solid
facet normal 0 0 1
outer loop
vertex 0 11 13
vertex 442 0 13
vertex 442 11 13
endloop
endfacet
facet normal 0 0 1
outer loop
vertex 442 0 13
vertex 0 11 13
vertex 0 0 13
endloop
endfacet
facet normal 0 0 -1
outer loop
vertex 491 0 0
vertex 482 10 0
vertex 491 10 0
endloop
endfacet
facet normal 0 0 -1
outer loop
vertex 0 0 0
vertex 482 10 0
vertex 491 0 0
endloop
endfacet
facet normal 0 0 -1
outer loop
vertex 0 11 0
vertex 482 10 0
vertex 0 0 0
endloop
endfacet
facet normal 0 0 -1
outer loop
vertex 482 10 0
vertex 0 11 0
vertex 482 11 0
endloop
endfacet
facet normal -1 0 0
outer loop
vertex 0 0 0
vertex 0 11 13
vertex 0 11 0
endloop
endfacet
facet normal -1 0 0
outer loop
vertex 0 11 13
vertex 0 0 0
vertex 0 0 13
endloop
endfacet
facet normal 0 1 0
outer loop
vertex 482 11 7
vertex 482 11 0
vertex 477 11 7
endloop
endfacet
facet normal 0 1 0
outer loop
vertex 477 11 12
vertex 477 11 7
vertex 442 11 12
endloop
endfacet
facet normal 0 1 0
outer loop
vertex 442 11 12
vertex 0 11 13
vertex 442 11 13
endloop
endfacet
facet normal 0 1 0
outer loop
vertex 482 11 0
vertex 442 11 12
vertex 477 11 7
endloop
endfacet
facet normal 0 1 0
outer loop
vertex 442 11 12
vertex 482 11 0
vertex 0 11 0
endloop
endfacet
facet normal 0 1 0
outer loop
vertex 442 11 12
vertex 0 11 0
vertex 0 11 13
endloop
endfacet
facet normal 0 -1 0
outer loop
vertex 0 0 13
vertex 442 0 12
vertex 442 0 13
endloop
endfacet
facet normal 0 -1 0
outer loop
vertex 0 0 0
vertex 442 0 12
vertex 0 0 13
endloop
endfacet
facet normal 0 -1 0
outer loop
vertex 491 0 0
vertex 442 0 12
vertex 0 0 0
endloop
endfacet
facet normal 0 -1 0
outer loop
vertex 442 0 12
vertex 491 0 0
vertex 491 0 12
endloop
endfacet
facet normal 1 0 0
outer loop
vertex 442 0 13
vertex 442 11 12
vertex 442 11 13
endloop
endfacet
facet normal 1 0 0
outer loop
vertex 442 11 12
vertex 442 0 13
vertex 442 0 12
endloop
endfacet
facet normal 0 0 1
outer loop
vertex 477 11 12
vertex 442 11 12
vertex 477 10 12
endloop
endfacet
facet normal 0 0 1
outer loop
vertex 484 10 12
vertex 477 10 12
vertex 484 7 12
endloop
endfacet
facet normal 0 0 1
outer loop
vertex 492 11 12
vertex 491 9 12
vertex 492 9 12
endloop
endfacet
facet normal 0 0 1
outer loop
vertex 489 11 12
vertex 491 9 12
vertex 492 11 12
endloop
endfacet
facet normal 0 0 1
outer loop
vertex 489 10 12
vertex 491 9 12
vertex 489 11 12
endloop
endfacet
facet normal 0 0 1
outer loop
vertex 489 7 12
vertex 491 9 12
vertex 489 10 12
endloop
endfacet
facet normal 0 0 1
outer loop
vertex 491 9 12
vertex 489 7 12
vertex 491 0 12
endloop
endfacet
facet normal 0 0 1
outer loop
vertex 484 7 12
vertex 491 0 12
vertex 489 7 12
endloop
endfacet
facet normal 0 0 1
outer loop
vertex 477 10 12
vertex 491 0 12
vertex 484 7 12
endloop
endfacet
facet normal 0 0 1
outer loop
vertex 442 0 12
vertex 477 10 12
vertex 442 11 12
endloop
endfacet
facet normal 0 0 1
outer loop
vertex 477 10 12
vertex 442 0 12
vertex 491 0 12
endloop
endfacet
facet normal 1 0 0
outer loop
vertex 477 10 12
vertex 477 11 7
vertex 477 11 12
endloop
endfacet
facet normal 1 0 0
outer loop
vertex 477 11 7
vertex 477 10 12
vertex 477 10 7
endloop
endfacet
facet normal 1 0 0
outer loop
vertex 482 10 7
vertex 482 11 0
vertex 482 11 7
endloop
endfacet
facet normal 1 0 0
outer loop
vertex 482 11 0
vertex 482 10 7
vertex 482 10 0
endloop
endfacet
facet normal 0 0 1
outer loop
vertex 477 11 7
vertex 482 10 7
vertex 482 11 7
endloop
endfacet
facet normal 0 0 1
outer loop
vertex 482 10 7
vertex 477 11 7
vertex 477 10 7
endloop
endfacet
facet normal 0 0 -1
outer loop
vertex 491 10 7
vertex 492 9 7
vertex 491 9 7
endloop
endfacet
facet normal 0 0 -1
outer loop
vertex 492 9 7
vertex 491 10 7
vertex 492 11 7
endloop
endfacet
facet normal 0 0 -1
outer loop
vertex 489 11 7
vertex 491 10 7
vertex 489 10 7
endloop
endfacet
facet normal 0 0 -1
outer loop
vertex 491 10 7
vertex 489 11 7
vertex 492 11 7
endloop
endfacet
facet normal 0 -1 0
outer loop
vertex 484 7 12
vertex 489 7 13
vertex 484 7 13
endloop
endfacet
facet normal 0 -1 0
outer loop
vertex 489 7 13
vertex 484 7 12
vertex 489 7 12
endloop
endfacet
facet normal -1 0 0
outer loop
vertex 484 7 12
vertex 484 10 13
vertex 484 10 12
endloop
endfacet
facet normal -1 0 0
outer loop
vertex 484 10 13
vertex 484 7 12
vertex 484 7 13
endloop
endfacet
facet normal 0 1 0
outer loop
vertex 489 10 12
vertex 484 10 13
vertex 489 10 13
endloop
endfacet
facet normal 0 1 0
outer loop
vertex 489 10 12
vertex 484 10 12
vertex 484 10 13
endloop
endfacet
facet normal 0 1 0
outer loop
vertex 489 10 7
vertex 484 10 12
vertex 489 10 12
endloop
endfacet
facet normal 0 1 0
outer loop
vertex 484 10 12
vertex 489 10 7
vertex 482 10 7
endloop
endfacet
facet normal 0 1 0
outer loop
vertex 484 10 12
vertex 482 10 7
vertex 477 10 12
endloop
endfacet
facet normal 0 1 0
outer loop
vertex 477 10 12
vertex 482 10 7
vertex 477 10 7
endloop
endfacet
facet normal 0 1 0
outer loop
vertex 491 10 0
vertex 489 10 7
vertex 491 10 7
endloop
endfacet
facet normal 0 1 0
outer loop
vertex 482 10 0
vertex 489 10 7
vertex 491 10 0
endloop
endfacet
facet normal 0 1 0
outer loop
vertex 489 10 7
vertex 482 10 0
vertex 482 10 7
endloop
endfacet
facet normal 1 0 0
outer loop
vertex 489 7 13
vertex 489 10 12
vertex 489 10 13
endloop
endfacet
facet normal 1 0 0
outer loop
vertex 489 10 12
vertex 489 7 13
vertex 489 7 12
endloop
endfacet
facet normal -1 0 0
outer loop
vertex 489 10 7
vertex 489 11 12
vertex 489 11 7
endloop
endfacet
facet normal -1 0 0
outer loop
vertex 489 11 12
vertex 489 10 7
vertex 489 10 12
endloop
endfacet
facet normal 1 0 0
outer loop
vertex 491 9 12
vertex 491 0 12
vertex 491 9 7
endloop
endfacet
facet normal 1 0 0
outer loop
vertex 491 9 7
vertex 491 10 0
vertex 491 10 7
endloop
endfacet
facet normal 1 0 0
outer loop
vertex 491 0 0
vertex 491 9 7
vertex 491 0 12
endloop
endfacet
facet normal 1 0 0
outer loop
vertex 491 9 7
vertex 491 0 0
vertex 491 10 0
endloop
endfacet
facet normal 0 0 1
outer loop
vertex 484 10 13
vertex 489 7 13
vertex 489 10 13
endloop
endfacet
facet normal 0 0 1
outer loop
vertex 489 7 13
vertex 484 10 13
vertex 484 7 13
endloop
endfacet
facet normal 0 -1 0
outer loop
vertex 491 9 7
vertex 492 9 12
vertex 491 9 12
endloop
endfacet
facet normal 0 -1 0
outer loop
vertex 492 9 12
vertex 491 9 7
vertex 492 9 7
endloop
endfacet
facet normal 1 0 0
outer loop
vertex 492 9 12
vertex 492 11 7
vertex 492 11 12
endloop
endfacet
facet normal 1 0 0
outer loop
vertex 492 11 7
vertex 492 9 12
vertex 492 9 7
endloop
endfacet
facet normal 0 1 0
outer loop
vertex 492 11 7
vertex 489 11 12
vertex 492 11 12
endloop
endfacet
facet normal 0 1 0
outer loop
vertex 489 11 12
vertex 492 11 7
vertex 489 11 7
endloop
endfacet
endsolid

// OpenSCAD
translate([8.5, 5.5, 6.5]) color([0.2882277186993394, 0.4689175335863792, 0.03492832759702502]) cube([17, 11, 13], center=true);
translate([25.5, 5.5, 6.5]) color([0.5317931441254861, 0.552095437515129, 0.9340898594770107]) cube([17, 11, 13], center=true);
translate([42.5, 5.5, 6.5]) color([0.03830085289416996, 0.3950652682884612, 0.1200155720396251]) cube([17, 11, 13], center=true);
translate([59.5, 5.5, 6.5]) color([0.34658884626630715, 0.051152415727703016, 0.2730496953424699]) cube([17, 11, 13], center=true);
translate([76.5, 5.5, 6.5]) color([0.9956802504828091, 0.25391998649183944, 0.6803935586065328]) cube([17, 11, 13], center=true);
translate([93.5, 5.5, 6.5]) color([0.7027090324157298, 0.9291230685247301, 0.9949404722907454]) cube([17, 11, 13], center=true);
translate([110.5, 5.5, 6.5]) color([0.7620813713006523, 0.7625973189567923, 0.5162610213479427]) cube([17, 11, 13], center=true);
translate([127.5, 5.5, 6.5]) color([0.3860717563215982, 0.8343975914408754, 0.2506337702942619]) cube([17, 11, 13], center=true);
translate([144.5, 5.5, 6.5]) color([0.11599539642064438, 0.9817240858781537, 0.8047994372884794]) cube([17, 11, 13], center=true);
translate([161.5, 5.5, 6.5]) color([0.9431012043694105, 0.24264659424234813, 0.6738638931519124]) cube([17, 11, 13], center=true);
translate([178.5, 5.5, 6.5]) color([0.5327800265053269, 0.8756440829735669, 0.16255101499230828]) cube([17, 11, 13], center=true);
translate([195.5, 5.5, 6.5]) color([0.8680483691353614, 0.15305579700066485, 0.8462165202751376]) cube([17, 11, 13], center=true);
translate([212.5, 5.5, 6.5]) color([0.8200801239095041, 0.5849326984313064, 0.05125489506773162]) cube([17, 11, 13], center=true);
translate([229.5, 5.5, 6.5]) color([0.156166769208809, 0.34458118202681143, 0.291190613997825]) cube([17, 11, 13], center=true);
translate([246.5, 5.5, 6.5]) color([0.29342424365134856, 0.49485912757206985, 0.40365829021262367]) cube([17, 11, 13], center=true);
translate([263.5, 5.5, 6.5]) color([0.43100562682353716, 0.17003546655932655, 0.788340085303476]) cube([17, 11, 13], center=true);
translate([280.5, 5.5, 6.5]) color([0.5686027559906347, 0.44188886974638586, 0.3413461590512491]) cube([17, 11, 13], center=true);
translate([297.5, 5.5, 6.5]) color([0.009317740415098474, 0.72162474304745, 0.9099060293040379]) cube([17, 11, 13], center=true);
translate([314.5, 5.5, 6.5]) color([0.6642090292154819, 0.6628365798191557, 0.2575988974219705]) cube([17, 11, 13], center=true);
translate([326.5, 5.5, 6.5]) color([0.6122127561841502, 0.07024606726227145, 0.936077955543095]) cube([7, 11, 13], center=true);
translate([333.5, 5.5, 6.5]) color([0.27870721332570936, 0.8301443917589898, 0.5295296249528143]) cube([7, 11, 13], center=true);
translate([340.5, 5.5, 6.5]) color([0.06328696503387199, 0.639390097241117, 0.579686955437464]) cube([7, 11, 13], center=true);
translate([347.5, 5.5, 6.5]) color([0.9416538141960143, 0.6321291610349786, 0.5434228748459046]) cube([7, 11, 13], center=true);
translate([354.5, 5.5, 6.5]) color([0.38469874676133664, 0.434637548519362, 0.31139777068021024]) cube([7, 11, 13], center=true);
translate([361.5, 5.5, 6.5]) color([0.01363511702942577, 0.7785312160167684, 0.8197509625398982]) cube([7, 11, 13], center=true);
translate([368.5, 5.5, 6.5]) color([0.28044077713976767, 0.2581907625337724, 0.5272652548146236]) cube([7, 11, 13], center=true);
translate([375.5, 5.5, 6.5]) color([0.3179301097250754, 0.3422638341038545, 0.7055726929201963]) cube([7, 11, 13], center=true);
translate([382.5, 5.5, 6.5]) color([0.43169639849300545, 0.14170724037842175, 0.0059275683019511805]) cube([7, 11, 13], center=true);
translate([389.5, 5.5, 6.5]) color([0.5113413643489257, 0.7846494738841625, 0.7013909140505133]) cube([7, 11, 13], center=true);
translate([396.5, 5.5, 6.5]) color([0.7815279332048084, 0.38414456219182536, 0.4641305725985776]) cube([7, 11, 13], center=true);
translate([403.5, 5.5, 6.5]) color([0.036369164001931575, 0.9124290899309246, 0.6366653413633517]) cube([7, 11, 13], center=true);
translate([410.5, 5.5, 6.5]) color([0.798477007479407, 0.7602358551941967, 0.899814300356001]) cube([7, 11, 13], center=true);
translate([417.5, 5.5, 6.5]) color([0.3622224295816935, 0.9815510059994267, 0.15851660579635174]) cube([7, 11, 13], center=true);
translate([424.5, 5.5, 6.5]) color([0.19450942151924966, 0.35447317829590397, 0.700089123077614]) cube([7, 11, 13], center=true);
translate([431.5, 5.5, 6.5]) color([0.019141470871264166, 0.7352582011311831, 0.5715587801616956]) cube([7, 11, 13], center=true);
translate([438.5, 5.5, 6.5]) color([0.24207966979200135, 0.18514161515939986, 0.7580746928341441]) cube([7, 11, 13], center=true);
translate([444.5, 5.5, 3.5]) color([0.4199819570625165, 0.5731405723704375, 0.23673356878784502]) cube([5, 11, 7], center=true);
translate([445.5, 5.5, 9.5]) color([0.7138158488992904, 0.8637627475626694, 0.8949592620642776]) cube([7, 11, 5], center=true);
translate([449.5, 5.5, 3.5]) color([0.8103115760161889, 0.1004216369837837, 0.18827941391234093]) cube([5, 11, 7], center=true);
translate([452.5, 5.5, 9.5]) color([0.44049583318501173, 0.06522983258952386, 0.42674703623912436]) cube([7, 11, 5], center=true);
translate([454.5, 5.5, 3.5]) color([0.3947422574489625, 0.27185274848852736, 0.43721657158275895]) cube([5, 11, 7], center=true);
translate([459.5, 5.5, 3.5]) color([0.7577296702077931, 0.3561631337530091, 0.3277620307403001]) cube([5, 11, 7], center=true);
translate([459.5, 5.5, 9.5]) color([0.30701912216942273, 0.492518074892234, 0.7625268269371841]) cube([7, 11, 5], center=true);
translate([464.5, 5.5, 3.5]) color([0.2027877178963453, 0.39789846082497404, 0.4356119392473006]) cube([5, 11, 7], center=true);
translate([466.5, 5.5, 9.5]) color([0.6353731723550147, 0.673076446274384, 0.6970991483341651]) cube([7, 11, 5], center=true);
translate([469.5, 5.5, 3.5]) color([0.8225488218547198, 0.5826892216899469, 0.3545830833155835]) cube([5, 11, 7], center=true);
translate([474.5, 5.5, 3.5]) color([0.5687886411459258, 0.564415288794693, 0.2783497745403337]) cube([5, 11, 7], center=true);
translate([473.5, 5.5, 9.5]) color([0.8220051901362931, 0.39809270556066123, 0.9209203386432881]) cube([7, 11, 5], center=true);
translate([479.5, 5.5, 3.5]) color([0.13533998311747797, 0.08148203466772541, 0.8649487446802395]) cube([5, 11, 7], center=true);
translate([478.5, 3.5, 9.5]) color([0.36102136972914045, 0.06937329613248533, 0.7172877126247486]) cube([3, 7, 5], center=true);
translate([481.5, 3.5, 9.5]) color([0.671396341477498, 0.47110224547326685, 0.3145322421799046]) cube([3, 7, 5], center=true);
translate([480.5, 8.5, 9.5]) color([0.8413649413366762, 0.9545082818366412, 0.02538948740661906]) cube([7, 3, 5], center=true);
translate([483.5, 2.5, 3.5]) color([0.39264862168779513, 0.12527064222330164, 0.9928151500577586]) cube([3, 5, 7], center=true);
translate([483.5, 7.5, 3.5]) color([0.6355716010561779, 0.40641678624517696, 0.1421319514189895]) cube([3, 5, 7], center=true);
translate([484.5, 3.5, 9.5]) color([0.14748951348813844, 0.8666090764559645, 0.5114920143771782]) cube([3, 7, 5], center=true);
translate([486.5, 2.5, 3.5]) color([0.16291179601388028, 0.8928293074217152, 0.9106207302279238]) cube([3, 5, 7], center=true);
translate([486.5, 7.5, 3.5]) color([0.7053130391381187, 0.7162737307255599, 0.7235742512845528]) cube([3, 5, 7], center=true);
translate([487.5, 3.5, 9.5]) color([0.7298089625221481, 0.5196081403156461, 0.823493134639761]) cube([3, 7, 5], center=true);
translate([489.5, 2.5, 3.5]) color([0.6911885197769689, 0.6973164426626367, 0.38726457915960755]) cube([3, 5, 7], center=true);
translate([489.5, 7.5, 3.5]) color([0.18022138882203653, 0.8001465394041192, 0.8129994204848935]) cube([3, 5, 7], center=true);
translate([486.5, 8.5, 8.0]) color([0.08072942167368968, 0.17442535469903642, 0.26558344961408153]) cube([5, 3, 2], center=true);
translate([486.5, 8.5, 10.0]) color([0.8002006207478382, 0.3279381595582189, 0.7086727191051987]) cube([5, 3, 2], center=true);
translate([486.5, 8.5, 12.0]) color([0.7823295314553788, 0.5174360046946651, 0.45647885649310815]) cube([5, 3, 2], center=true);
translate([490.0, 1.5, 9.5]) color([0.9099967640280606, 0.7566722996545016, 0.44882496858184395]) cube([2, 3, 5], center=true);
translate([490.0, 4.5, 9.5]) color([0.15281911968142636, 0.6325441046469116, 0.1769660088535372]) cube([2, 3, 5], center=true);
translate([490.0, 7.5, 9.5]) color([0.5122224095001495, 0.8959696721858674, 0.31608020378500323]) cube([2, 3, 5], center=true);
translate([490.5, 10.0, 9.5]) color([0.9467436825606468, 0.1928870204716916, 0.7910187054913302]) cube([3, 2, 5], center=true);
